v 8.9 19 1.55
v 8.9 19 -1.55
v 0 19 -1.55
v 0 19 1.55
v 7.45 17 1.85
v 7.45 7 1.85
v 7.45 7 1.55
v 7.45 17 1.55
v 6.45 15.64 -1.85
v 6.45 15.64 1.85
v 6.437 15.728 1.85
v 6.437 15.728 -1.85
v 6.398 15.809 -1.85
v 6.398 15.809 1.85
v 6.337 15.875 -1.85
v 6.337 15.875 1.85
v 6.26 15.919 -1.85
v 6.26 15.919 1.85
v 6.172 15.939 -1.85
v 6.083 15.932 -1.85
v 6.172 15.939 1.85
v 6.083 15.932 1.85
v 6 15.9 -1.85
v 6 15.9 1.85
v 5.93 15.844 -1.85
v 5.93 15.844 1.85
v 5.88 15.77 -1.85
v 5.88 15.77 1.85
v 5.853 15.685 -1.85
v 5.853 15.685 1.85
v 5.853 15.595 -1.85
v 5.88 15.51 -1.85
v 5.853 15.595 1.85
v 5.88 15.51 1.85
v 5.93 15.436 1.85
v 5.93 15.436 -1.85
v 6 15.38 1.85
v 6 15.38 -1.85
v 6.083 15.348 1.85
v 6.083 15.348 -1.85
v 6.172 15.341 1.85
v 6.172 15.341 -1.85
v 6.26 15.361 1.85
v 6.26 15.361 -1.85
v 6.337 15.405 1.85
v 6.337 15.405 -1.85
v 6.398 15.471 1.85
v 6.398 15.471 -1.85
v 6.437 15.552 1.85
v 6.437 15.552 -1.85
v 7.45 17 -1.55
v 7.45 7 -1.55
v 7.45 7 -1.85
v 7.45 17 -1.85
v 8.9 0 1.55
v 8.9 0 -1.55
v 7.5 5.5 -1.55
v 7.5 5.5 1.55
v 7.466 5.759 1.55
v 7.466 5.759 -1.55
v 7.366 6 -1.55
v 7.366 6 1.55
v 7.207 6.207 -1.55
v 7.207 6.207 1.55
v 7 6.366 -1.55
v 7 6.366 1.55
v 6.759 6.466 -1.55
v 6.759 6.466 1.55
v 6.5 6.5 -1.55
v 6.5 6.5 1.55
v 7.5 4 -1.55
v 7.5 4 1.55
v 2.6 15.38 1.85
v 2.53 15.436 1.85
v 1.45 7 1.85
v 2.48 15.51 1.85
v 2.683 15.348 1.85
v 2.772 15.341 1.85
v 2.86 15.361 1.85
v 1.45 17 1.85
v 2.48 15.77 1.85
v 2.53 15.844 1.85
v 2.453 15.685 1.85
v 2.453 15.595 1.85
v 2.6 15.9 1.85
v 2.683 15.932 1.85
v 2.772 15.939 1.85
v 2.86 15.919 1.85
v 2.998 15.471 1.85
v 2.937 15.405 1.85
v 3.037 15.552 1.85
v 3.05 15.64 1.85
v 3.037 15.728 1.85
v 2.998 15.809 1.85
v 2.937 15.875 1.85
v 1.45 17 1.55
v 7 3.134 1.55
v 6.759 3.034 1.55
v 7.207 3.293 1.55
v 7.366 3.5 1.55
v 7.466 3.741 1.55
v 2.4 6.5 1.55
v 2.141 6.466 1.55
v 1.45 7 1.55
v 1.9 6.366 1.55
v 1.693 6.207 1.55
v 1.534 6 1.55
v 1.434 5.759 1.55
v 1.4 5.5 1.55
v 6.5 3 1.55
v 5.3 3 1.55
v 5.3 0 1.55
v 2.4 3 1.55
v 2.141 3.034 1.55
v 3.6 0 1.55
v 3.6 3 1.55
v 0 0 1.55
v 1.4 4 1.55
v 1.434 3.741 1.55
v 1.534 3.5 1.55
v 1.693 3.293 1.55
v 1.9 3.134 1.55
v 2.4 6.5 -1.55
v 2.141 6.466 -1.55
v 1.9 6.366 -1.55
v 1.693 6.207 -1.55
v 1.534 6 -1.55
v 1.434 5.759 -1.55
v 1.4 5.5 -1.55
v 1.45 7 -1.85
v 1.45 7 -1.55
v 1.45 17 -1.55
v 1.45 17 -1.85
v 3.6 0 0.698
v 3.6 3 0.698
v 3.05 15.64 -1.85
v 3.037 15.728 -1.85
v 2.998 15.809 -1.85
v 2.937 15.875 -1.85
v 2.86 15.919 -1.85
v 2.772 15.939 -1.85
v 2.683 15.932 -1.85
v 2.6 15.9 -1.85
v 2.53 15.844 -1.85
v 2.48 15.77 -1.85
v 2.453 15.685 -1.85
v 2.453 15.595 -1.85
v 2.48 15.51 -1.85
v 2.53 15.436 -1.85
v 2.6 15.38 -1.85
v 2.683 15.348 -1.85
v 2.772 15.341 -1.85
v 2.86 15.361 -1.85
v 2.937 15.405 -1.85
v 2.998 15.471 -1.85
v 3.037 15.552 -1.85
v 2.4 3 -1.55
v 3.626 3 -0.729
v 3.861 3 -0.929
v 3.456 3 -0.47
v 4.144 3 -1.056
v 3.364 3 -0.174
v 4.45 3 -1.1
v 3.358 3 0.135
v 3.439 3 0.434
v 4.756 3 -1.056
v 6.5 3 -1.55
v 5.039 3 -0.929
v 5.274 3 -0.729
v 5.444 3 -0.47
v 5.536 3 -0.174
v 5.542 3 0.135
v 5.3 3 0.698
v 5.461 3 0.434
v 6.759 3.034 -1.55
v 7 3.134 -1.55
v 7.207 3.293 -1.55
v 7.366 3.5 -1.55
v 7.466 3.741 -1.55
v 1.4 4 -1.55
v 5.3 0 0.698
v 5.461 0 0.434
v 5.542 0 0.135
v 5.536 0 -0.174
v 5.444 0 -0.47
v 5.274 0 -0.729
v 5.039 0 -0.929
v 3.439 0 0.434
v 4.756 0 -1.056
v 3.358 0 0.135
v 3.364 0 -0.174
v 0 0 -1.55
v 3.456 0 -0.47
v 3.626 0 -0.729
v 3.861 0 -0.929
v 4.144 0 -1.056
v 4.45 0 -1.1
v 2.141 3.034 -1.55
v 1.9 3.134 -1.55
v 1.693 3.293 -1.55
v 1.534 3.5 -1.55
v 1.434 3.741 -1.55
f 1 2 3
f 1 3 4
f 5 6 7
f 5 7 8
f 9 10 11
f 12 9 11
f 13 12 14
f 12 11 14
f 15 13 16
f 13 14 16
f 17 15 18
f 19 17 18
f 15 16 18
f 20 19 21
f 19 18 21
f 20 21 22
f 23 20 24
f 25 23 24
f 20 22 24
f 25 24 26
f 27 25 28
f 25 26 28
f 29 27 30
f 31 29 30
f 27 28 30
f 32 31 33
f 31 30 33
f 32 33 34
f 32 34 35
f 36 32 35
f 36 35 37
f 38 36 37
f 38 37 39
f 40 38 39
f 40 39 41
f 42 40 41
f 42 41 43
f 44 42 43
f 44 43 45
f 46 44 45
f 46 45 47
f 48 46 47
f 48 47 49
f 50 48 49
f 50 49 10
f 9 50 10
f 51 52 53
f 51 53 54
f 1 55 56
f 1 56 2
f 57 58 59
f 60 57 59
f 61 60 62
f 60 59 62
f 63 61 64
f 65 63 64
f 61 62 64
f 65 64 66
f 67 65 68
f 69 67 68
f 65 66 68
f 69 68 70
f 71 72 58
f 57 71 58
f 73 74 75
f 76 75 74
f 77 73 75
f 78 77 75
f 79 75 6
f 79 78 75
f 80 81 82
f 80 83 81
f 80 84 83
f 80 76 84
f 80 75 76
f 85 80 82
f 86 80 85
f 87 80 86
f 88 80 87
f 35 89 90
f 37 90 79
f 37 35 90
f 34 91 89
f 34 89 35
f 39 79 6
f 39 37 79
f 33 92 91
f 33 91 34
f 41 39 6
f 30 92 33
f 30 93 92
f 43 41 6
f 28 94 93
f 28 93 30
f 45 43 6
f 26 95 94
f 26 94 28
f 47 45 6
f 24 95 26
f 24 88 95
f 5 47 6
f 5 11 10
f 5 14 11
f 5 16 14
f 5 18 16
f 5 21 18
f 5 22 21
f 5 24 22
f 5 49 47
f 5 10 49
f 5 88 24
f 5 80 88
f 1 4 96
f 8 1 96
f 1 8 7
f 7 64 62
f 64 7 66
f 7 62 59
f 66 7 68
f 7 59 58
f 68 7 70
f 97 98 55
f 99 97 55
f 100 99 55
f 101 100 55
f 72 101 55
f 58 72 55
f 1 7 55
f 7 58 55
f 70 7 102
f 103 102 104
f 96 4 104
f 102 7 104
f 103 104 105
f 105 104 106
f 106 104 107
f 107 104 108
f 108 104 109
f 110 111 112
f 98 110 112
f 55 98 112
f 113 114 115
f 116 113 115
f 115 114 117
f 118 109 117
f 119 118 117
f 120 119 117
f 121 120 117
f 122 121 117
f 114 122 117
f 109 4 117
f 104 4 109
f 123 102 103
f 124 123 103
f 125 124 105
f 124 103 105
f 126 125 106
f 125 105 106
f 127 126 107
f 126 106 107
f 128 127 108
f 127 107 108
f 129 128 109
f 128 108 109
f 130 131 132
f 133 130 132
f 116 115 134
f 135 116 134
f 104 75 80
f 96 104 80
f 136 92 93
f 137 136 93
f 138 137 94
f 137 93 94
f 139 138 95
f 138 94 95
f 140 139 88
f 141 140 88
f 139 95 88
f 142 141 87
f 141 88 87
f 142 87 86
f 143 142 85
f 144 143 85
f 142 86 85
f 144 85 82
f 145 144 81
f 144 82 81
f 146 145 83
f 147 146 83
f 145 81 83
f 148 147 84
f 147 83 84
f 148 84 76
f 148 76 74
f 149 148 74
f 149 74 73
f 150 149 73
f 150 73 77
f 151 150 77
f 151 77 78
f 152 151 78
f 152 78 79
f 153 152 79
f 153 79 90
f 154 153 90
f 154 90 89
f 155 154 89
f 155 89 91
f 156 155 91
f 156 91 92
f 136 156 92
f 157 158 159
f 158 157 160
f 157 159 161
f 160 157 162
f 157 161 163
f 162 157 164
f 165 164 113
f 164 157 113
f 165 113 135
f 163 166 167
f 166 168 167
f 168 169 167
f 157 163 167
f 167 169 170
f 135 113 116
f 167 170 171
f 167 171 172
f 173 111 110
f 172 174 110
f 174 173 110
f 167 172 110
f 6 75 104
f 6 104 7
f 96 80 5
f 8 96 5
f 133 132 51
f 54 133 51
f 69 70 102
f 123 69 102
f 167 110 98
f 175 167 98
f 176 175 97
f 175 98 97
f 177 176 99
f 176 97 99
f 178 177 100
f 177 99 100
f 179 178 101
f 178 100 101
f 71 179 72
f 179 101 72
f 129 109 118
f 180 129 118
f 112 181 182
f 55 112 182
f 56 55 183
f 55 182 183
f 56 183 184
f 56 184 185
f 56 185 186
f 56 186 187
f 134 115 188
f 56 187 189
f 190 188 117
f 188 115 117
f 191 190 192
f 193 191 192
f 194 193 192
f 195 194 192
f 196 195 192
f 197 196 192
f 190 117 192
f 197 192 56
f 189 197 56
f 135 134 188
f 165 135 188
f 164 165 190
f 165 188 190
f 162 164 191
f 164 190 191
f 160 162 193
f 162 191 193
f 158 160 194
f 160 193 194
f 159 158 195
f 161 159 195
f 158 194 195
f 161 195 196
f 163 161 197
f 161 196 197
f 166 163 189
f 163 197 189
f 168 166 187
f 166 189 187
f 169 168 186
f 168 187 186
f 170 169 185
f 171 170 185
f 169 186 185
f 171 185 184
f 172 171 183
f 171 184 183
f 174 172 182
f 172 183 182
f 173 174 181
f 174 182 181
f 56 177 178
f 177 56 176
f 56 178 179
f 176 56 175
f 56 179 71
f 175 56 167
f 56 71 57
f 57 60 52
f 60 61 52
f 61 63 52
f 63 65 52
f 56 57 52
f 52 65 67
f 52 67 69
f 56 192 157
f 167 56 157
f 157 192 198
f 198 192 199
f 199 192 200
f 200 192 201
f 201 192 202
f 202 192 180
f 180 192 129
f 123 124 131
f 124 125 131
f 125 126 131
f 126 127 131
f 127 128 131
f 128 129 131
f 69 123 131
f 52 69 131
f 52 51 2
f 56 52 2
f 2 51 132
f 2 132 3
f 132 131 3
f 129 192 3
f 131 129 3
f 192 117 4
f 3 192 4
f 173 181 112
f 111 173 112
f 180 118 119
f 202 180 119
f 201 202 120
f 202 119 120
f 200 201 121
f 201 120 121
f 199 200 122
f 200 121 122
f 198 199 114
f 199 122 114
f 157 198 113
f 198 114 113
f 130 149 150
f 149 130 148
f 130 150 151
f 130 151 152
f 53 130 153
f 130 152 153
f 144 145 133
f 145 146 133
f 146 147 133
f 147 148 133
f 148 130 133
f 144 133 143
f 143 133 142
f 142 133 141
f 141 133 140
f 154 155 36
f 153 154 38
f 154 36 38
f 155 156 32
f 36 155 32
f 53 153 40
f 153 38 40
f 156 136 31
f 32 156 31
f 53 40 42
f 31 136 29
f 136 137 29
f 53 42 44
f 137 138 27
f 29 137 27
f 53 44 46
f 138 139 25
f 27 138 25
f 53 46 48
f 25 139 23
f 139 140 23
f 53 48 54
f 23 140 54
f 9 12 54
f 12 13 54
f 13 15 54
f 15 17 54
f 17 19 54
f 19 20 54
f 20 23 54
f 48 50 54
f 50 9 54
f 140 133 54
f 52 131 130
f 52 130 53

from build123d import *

# Parameters (mm, degrees)
F4_DEPTH  = 8.9
F6_W      = 6
F6_H      = 10
F7_DEPTH  = 3.7
F8_R      = 0.3
F9_DEPTH  = 3.701
F11_DEPTH = 3


with BuildPart() as f4:
    # F3 (on Right) → F4 (new body)
    with BuildSketch(Plane.YZ):
        Polygon((0, 1.55), (0, 0), (0, -1.55), (19, -1.55), (19, 0), (19, 1.55), align=None)
    extrude(amount=F4_DEPTH)

    # F6 (on offset) → F7 (join)
    with BuildSketch(Plane.XY.offset(1.85)):
        with Locations((4.45, 12)):
            Rectangle(F6_W, F6_H)
    extrude(amount=-F7_DEPTH)

    # F8 (on offset) → F9 (cut, through all)
    with BuildSketch(Plane.XY.offset(1.85)):
        with BuildLine():
            ThreePointArc((1.4, 4), (1.6928932188, 3.2928932188), (2.4, 3))
            Line((2.4, 3), (6.5, 3))
            ThreePointArc((6.5, 3), (7.2071067812, 3.2928932188), (7.5, 4))
            Line((7.5, 4), (7.5, 5.5))
            ThreePointArc((7.5, 5.5), (7.2071067812, 6.2071067812), (6.5, 6.5))
            Line((6.5, 6.5), (2.4, 6.5))
            ThreePointArc((2.4, 6.5), (1.6928932188, 6.2071067812), (1.4, 5.5))
            Line((1.4, 5.5), (1.4, 4))
        make_face()
        with Locations((2.75, 15.64)):
            Circle(F8_R)
        with Locations((6.15, 15.64)):
            Circle(F8_R)
    extrude(amount=-F9_DEPTH, mode=Mode.SUBTRACT)

    # F10 (on face) → F11 (cut, through all)
    with BuildSketch(Plane.XZ):
        with BuildLine():
            Line((5.3, 1.55), (3.6, 1.55))
            Line((3.6, 1.55), (3.6, 0.6982120022))
            ThreePointArc((3.6, 0.6982120022), (4.45, -1.1), (5.3, 0.6982120022))
            Line((5.3, 0.6982120022), (5.3, 1.55))
        make_face()
    extrude(amount=-F11_DEPTH, mode=Mode.SUBTRACT)


solid = f4.part
